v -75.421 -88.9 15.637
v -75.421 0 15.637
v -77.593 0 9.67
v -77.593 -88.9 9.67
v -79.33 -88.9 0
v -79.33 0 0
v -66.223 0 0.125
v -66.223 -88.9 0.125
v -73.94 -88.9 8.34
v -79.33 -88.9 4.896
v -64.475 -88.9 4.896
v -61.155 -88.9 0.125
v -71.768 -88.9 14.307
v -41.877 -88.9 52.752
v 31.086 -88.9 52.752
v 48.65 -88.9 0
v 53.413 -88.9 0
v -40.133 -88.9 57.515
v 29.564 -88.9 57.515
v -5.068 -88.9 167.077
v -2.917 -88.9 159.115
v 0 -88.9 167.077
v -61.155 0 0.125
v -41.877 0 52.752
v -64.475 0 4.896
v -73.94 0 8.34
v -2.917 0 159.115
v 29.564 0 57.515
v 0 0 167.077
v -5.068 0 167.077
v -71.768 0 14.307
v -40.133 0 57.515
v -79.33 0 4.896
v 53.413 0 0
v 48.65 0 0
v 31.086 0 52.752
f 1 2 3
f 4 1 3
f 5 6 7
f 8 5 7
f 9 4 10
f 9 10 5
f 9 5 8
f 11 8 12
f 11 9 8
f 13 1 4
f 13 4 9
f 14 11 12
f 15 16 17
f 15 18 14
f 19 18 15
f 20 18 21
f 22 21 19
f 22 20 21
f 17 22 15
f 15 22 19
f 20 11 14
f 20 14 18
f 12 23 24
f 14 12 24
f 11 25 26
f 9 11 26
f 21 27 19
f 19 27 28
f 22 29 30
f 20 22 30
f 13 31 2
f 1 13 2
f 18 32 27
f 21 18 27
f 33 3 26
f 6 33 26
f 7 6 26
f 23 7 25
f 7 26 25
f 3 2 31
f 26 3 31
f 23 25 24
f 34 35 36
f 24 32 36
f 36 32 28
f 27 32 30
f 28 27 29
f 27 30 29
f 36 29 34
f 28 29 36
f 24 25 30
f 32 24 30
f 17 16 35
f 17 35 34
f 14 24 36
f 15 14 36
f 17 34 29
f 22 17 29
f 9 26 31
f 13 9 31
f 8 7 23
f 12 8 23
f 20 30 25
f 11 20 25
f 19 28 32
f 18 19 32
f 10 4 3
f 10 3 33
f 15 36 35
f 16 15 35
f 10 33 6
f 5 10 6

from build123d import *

# Parameters (mm, degrees)
F1_DEPTH = 88.9


with BuildPart() as f1:
    # F0 (on Front) → F1 (new body)
    with BuildSketch(Plane.XZ):
        Polygon((53.412888, 0), (0, 167.077348), (-5.068147, 167.077348), (-64.475396, 4.895769), (-73.939636, 8.340181), (-71.767969, 14.307288), (-75.421233, 15.636856), (-77.5929, 9.669749), (-79.330342, 4.895769), (-79.330342, 0), (-66.222783, 0.125408), (-61.154637, 0.125408), (-41.877323, 52.752407), (-2.916649, 52.752407), (31.086335, 52.752407), (48.650388, 0), align=None)
        Polygon((29.563813, 57.514907), (-2.916649, 57.514907), (-40.132815, 57.514907), (-2.916649, 159.114907), align=None, mode=Mode.SUBTRACT)
    extrude(amount=F1_DEPTH)


solid = f1.part
